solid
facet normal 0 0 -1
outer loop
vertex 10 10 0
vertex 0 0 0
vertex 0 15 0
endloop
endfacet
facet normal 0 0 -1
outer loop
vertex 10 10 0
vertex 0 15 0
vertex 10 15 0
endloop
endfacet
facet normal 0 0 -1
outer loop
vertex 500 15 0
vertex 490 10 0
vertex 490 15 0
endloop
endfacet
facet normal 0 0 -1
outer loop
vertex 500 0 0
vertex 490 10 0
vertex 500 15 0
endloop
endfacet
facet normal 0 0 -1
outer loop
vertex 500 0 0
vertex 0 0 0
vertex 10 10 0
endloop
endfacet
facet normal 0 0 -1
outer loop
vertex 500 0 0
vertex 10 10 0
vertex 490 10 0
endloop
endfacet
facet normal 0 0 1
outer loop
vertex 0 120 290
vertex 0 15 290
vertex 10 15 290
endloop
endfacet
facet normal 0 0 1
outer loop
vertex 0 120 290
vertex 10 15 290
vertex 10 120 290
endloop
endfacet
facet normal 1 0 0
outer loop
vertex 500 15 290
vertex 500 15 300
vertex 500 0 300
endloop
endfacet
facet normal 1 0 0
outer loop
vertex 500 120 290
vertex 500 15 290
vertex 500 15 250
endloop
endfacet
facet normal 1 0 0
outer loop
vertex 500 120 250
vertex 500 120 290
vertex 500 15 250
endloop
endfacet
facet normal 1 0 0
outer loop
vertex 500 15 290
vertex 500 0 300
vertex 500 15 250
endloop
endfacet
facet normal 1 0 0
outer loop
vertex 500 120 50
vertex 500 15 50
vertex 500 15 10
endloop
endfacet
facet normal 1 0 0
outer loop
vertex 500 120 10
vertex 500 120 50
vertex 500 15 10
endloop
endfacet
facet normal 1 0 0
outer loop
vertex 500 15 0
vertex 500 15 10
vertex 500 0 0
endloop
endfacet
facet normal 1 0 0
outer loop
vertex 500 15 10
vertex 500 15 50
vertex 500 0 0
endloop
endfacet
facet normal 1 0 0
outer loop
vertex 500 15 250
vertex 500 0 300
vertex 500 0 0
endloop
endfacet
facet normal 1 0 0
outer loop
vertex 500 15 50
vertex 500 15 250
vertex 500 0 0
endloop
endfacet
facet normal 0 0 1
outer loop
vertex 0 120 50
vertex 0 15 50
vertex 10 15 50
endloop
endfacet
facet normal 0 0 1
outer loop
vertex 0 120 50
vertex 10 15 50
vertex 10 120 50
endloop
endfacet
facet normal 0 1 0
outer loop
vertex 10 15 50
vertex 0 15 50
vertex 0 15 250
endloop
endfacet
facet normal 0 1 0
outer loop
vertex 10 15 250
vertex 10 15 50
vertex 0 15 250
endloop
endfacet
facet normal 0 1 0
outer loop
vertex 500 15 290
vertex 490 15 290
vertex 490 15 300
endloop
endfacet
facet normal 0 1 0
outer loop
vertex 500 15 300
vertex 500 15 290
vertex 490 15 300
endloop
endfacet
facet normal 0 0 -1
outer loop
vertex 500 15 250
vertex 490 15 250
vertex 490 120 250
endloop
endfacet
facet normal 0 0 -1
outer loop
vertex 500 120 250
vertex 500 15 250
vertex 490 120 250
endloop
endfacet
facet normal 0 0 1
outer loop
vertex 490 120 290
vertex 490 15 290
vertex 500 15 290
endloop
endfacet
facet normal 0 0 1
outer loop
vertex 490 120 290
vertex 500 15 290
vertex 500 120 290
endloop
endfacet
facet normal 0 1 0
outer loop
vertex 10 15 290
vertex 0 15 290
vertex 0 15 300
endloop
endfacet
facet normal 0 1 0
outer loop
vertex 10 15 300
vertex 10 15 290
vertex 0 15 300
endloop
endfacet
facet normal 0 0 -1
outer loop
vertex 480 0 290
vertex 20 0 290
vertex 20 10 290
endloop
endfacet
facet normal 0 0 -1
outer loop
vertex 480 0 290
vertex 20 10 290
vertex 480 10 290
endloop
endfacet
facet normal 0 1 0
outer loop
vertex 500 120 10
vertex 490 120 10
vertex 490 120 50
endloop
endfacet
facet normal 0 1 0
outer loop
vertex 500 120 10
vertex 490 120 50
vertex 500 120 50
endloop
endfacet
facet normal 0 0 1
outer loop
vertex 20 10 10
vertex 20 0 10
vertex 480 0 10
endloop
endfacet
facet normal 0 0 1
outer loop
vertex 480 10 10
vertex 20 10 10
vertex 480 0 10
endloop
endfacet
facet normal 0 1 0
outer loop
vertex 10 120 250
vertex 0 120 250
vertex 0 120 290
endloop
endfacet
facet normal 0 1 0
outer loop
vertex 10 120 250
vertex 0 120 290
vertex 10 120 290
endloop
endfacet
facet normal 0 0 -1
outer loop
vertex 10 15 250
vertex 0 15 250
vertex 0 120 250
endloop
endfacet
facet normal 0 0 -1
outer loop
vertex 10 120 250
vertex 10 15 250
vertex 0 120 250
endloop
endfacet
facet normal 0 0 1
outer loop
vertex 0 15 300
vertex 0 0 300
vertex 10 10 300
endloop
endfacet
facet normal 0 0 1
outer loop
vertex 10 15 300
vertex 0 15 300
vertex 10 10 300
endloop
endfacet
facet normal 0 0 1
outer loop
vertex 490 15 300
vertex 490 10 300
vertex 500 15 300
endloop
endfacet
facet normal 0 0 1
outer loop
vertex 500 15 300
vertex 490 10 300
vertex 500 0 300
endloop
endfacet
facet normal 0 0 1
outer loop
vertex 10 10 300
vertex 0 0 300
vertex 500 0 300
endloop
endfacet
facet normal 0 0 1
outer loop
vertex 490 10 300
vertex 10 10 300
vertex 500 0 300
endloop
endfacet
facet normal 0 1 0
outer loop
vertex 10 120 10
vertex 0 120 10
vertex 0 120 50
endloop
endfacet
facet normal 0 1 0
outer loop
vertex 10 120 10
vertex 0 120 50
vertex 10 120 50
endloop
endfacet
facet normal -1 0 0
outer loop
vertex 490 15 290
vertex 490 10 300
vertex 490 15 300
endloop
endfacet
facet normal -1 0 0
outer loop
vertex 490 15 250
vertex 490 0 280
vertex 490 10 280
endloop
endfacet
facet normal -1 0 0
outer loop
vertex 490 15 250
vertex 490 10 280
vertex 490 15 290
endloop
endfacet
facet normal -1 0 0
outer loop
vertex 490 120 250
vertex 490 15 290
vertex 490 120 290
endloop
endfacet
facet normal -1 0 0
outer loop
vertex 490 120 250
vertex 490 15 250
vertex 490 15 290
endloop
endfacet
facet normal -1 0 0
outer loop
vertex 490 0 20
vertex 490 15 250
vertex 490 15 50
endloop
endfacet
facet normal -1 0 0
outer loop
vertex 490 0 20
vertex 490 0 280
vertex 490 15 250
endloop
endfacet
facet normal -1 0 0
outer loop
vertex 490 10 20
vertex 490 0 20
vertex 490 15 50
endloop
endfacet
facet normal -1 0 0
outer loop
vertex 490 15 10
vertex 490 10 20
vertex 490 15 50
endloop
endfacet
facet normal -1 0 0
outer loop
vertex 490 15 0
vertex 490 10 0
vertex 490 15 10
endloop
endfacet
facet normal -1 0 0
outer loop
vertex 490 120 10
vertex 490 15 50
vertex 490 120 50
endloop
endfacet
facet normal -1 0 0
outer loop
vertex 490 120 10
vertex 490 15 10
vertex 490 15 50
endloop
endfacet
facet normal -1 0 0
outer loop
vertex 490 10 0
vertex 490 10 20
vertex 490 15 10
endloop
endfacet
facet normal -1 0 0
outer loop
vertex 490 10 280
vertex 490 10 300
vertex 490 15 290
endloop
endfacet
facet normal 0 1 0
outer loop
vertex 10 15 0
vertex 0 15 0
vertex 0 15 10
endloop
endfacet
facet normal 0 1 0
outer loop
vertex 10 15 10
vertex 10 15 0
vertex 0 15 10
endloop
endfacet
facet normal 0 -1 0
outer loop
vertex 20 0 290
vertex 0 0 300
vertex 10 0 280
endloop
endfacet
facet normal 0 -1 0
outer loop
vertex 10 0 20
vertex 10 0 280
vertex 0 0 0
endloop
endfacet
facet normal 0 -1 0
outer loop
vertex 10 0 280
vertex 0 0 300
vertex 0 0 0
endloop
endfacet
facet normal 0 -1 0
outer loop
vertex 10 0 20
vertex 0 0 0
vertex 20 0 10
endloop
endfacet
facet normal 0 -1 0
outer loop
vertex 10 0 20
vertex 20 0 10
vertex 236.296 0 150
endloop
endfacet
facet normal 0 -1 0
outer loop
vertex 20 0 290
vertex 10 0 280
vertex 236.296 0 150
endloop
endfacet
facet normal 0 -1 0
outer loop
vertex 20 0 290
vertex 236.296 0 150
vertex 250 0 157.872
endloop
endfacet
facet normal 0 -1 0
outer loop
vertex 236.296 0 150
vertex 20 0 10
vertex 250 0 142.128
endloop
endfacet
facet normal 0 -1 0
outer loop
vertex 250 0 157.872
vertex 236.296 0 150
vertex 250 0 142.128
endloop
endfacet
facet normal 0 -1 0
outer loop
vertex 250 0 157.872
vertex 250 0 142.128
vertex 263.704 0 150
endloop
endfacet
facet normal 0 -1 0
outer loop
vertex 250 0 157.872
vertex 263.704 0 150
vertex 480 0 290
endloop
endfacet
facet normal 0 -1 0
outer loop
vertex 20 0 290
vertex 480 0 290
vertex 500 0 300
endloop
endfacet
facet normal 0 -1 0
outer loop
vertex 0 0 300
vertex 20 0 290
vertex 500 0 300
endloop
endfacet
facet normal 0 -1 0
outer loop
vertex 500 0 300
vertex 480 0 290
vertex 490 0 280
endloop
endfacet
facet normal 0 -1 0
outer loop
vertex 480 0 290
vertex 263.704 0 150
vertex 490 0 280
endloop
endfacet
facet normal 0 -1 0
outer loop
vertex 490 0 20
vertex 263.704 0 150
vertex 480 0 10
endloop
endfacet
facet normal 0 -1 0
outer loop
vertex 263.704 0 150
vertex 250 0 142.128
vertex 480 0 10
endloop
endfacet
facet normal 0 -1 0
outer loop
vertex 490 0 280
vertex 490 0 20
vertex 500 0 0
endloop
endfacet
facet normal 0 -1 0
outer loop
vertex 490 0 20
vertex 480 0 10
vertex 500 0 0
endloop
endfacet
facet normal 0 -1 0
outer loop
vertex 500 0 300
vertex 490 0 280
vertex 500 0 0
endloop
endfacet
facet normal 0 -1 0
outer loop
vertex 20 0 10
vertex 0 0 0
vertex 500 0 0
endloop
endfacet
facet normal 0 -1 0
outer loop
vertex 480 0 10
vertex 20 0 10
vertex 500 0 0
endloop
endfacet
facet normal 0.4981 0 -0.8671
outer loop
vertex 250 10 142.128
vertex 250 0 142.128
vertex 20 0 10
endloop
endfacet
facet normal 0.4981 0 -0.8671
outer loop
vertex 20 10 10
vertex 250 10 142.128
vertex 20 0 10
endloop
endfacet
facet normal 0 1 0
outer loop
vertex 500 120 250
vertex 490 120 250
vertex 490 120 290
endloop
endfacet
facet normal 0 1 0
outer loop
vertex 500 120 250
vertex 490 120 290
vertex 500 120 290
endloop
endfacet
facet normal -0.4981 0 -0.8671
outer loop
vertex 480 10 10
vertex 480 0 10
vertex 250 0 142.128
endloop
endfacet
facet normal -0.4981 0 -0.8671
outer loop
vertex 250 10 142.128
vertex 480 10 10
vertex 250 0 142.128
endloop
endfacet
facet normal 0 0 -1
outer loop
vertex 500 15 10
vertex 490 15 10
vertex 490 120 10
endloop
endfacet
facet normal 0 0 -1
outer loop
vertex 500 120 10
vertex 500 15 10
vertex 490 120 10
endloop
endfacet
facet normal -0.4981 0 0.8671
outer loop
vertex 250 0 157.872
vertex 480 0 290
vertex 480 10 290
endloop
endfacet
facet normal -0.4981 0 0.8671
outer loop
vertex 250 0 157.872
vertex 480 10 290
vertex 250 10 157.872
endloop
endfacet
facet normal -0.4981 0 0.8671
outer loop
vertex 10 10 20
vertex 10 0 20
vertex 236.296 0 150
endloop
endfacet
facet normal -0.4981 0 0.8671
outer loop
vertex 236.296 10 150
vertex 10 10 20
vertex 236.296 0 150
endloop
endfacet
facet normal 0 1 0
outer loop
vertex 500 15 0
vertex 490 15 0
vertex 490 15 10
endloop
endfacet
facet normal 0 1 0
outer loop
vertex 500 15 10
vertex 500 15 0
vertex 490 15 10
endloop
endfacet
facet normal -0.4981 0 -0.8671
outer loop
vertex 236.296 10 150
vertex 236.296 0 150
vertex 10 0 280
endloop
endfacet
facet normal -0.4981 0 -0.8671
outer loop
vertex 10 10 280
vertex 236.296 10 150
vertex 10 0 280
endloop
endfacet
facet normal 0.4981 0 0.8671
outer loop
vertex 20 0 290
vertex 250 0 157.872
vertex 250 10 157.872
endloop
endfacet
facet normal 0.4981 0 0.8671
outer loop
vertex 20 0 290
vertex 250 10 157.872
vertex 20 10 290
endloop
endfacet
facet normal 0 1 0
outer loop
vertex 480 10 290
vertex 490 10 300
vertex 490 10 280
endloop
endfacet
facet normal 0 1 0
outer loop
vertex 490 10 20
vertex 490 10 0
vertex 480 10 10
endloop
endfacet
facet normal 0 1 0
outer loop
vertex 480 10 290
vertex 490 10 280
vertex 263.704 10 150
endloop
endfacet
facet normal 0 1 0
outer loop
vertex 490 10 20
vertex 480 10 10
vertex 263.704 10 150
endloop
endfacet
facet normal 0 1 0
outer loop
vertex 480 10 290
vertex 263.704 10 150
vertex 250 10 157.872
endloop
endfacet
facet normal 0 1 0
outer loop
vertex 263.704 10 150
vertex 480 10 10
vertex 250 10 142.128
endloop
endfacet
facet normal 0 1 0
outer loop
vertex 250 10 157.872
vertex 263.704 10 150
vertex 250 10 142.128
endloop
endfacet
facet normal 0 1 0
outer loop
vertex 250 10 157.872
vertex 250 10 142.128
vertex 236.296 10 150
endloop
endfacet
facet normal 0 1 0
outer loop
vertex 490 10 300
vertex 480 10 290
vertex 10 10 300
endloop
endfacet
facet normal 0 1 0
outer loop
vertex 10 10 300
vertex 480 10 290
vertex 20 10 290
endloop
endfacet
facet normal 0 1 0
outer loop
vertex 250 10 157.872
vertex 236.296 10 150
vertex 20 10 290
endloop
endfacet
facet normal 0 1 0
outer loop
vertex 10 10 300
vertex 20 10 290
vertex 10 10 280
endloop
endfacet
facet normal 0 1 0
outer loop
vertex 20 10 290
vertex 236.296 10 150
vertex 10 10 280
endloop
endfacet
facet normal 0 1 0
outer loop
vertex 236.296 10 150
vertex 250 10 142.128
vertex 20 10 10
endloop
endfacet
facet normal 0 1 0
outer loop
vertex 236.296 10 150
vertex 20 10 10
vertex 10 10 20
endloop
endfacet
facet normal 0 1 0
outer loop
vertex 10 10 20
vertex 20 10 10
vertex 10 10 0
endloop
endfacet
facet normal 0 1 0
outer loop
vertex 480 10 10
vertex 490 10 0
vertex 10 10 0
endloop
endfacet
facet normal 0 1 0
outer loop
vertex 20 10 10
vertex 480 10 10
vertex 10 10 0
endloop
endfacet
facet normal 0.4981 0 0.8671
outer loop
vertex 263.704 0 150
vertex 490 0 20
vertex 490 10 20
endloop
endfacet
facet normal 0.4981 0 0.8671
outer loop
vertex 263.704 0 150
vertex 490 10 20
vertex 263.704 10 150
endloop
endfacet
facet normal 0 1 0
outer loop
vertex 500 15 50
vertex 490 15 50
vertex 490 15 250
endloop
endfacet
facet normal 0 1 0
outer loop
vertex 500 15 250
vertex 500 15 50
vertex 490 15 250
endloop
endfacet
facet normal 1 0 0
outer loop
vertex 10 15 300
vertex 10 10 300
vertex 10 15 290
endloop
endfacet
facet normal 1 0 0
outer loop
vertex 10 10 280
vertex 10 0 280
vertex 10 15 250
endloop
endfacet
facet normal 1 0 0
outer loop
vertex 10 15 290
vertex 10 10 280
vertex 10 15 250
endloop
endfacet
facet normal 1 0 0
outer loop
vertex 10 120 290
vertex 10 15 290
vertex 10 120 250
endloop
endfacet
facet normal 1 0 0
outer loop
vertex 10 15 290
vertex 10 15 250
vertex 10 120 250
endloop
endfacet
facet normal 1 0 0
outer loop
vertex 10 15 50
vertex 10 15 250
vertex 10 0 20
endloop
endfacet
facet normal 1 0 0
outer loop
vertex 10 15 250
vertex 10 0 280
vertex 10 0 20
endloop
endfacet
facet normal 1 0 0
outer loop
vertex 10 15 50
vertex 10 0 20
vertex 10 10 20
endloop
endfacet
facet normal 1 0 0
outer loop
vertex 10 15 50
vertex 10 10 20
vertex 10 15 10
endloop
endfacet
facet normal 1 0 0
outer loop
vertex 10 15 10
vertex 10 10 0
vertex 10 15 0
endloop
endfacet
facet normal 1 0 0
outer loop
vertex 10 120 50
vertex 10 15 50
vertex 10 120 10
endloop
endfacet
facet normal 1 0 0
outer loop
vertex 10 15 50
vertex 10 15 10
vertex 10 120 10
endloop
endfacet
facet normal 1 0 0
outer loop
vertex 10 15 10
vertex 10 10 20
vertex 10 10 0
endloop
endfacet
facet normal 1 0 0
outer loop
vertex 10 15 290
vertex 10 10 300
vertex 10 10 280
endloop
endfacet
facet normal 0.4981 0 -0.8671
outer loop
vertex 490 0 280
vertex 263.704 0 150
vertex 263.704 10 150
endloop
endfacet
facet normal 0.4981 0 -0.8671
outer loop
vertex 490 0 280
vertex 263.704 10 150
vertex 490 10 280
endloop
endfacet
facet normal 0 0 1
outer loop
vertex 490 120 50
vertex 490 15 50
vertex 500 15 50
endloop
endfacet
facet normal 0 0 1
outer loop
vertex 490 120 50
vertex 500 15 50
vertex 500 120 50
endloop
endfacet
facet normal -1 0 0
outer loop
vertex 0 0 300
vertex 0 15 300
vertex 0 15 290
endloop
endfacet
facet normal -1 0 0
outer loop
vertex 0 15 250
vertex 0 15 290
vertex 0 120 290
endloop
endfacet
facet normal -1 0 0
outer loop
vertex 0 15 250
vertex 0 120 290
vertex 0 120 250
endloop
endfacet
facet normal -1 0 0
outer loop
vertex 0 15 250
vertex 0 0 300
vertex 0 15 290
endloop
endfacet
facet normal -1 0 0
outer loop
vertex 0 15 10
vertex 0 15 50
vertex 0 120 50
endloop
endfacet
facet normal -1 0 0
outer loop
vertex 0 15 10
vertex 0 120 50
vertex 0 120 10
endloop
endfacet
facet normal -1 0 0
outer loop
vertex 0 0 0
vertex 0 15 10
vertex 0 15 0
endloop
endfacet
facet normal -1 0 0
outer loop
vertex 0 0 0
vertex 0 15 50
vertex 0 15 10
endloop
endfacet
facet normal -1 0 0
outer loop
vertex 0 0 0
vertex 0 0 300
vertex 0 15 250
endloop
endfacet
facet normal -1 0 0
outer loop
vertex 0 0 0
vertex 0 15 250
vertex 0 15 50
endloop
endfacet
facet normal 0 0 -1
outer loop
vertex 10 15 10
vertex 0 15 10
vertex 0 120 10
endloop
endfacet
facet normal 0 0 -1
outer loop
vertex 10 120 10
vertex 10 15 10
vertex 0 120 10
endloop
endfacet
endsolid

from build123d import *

# Parameters (mm, degrees)
BASE_W              = 500
BASE_H              = 300
EXTRUDE_1_DEPTH     = 120
SKETCH_1_W          = 480
SKETCH_1_H          = 110
CUT_EXTRUDE_1_DEPTH = 596.315042645
CUT_EXTRUDE_2_DEPTH = 596.315042645
SKETCH_3_W          = 200
SKETCH_3_H          = 105
SKETCH_3_W_2        = 10
CUT_EXTRUDE_3_DEPTH = 596.315042645


with BuildPart() as part:
    # base → 凸台-拉伸1 (new body)
    with BuildSketch(Plane(origin=(0, 0, 0), x_dir=(1, 0, 0), z_dir=(0, 1, 0))):
        with Locations((250, -150)):
            Rectangle(BASE_W, BASE_H)
    extrude(amount=EXTRUDE_1_DEPTH)

    # 草图1 → 切除-拉伸1 (cut, through all)
    with BuildSketch(Plane(origin=(0, 0, 0), x_dir=(-1, 0, 0), z_dir=(0, 0, -1))):
        with Locations((-250, 65)):
            Rectangle(SKETCH_1_W, SKETCH_1_H)
    extrude(amount=-CUT_EXTRUDE_1_DEPTH, mode=Mode.SUBTRACT)

    # 草图2 → 切除-拉伸2 (cut, through all)
    with BuildSketch(Plane.XZ):
        Polygon((10, 280), (10, 20), (236.296296296, 150), align=None)
        Polygon((20, 290), (480, 290), (250, 157.872340426), align=None)
        Polygon((263.703703704, 150), (490, 280), (490, 20), align=None)
        Polygon((250, 142.127659574), (20, 10), (480, 10), align=None)
    extrude(amount=-CUT_EXTRUDE_2_DEPTH, mode=Mode.SUBTRACT)

    # 草图3 → 切除-拉伸3 (cut, through all)
    with BuildSketch(Plane.ZY):
        with Locations((150, 67.5)):
            Rectangle(SKETCH_3_W, SKETCH_3_H)
        with Locations((5, 67.5)):
            Rectangle(SKETCH_3_W_2, SKETCH_3_H)
        with Locations((295, 67.5)):
            Rectangle(SKETCH_3_W_2, SKETCH_3_H)
    extrude(amount=-CUT_EXTRUDE_3_DEPTH, mode=Mode.SUBTRACT)


solid = part.part
